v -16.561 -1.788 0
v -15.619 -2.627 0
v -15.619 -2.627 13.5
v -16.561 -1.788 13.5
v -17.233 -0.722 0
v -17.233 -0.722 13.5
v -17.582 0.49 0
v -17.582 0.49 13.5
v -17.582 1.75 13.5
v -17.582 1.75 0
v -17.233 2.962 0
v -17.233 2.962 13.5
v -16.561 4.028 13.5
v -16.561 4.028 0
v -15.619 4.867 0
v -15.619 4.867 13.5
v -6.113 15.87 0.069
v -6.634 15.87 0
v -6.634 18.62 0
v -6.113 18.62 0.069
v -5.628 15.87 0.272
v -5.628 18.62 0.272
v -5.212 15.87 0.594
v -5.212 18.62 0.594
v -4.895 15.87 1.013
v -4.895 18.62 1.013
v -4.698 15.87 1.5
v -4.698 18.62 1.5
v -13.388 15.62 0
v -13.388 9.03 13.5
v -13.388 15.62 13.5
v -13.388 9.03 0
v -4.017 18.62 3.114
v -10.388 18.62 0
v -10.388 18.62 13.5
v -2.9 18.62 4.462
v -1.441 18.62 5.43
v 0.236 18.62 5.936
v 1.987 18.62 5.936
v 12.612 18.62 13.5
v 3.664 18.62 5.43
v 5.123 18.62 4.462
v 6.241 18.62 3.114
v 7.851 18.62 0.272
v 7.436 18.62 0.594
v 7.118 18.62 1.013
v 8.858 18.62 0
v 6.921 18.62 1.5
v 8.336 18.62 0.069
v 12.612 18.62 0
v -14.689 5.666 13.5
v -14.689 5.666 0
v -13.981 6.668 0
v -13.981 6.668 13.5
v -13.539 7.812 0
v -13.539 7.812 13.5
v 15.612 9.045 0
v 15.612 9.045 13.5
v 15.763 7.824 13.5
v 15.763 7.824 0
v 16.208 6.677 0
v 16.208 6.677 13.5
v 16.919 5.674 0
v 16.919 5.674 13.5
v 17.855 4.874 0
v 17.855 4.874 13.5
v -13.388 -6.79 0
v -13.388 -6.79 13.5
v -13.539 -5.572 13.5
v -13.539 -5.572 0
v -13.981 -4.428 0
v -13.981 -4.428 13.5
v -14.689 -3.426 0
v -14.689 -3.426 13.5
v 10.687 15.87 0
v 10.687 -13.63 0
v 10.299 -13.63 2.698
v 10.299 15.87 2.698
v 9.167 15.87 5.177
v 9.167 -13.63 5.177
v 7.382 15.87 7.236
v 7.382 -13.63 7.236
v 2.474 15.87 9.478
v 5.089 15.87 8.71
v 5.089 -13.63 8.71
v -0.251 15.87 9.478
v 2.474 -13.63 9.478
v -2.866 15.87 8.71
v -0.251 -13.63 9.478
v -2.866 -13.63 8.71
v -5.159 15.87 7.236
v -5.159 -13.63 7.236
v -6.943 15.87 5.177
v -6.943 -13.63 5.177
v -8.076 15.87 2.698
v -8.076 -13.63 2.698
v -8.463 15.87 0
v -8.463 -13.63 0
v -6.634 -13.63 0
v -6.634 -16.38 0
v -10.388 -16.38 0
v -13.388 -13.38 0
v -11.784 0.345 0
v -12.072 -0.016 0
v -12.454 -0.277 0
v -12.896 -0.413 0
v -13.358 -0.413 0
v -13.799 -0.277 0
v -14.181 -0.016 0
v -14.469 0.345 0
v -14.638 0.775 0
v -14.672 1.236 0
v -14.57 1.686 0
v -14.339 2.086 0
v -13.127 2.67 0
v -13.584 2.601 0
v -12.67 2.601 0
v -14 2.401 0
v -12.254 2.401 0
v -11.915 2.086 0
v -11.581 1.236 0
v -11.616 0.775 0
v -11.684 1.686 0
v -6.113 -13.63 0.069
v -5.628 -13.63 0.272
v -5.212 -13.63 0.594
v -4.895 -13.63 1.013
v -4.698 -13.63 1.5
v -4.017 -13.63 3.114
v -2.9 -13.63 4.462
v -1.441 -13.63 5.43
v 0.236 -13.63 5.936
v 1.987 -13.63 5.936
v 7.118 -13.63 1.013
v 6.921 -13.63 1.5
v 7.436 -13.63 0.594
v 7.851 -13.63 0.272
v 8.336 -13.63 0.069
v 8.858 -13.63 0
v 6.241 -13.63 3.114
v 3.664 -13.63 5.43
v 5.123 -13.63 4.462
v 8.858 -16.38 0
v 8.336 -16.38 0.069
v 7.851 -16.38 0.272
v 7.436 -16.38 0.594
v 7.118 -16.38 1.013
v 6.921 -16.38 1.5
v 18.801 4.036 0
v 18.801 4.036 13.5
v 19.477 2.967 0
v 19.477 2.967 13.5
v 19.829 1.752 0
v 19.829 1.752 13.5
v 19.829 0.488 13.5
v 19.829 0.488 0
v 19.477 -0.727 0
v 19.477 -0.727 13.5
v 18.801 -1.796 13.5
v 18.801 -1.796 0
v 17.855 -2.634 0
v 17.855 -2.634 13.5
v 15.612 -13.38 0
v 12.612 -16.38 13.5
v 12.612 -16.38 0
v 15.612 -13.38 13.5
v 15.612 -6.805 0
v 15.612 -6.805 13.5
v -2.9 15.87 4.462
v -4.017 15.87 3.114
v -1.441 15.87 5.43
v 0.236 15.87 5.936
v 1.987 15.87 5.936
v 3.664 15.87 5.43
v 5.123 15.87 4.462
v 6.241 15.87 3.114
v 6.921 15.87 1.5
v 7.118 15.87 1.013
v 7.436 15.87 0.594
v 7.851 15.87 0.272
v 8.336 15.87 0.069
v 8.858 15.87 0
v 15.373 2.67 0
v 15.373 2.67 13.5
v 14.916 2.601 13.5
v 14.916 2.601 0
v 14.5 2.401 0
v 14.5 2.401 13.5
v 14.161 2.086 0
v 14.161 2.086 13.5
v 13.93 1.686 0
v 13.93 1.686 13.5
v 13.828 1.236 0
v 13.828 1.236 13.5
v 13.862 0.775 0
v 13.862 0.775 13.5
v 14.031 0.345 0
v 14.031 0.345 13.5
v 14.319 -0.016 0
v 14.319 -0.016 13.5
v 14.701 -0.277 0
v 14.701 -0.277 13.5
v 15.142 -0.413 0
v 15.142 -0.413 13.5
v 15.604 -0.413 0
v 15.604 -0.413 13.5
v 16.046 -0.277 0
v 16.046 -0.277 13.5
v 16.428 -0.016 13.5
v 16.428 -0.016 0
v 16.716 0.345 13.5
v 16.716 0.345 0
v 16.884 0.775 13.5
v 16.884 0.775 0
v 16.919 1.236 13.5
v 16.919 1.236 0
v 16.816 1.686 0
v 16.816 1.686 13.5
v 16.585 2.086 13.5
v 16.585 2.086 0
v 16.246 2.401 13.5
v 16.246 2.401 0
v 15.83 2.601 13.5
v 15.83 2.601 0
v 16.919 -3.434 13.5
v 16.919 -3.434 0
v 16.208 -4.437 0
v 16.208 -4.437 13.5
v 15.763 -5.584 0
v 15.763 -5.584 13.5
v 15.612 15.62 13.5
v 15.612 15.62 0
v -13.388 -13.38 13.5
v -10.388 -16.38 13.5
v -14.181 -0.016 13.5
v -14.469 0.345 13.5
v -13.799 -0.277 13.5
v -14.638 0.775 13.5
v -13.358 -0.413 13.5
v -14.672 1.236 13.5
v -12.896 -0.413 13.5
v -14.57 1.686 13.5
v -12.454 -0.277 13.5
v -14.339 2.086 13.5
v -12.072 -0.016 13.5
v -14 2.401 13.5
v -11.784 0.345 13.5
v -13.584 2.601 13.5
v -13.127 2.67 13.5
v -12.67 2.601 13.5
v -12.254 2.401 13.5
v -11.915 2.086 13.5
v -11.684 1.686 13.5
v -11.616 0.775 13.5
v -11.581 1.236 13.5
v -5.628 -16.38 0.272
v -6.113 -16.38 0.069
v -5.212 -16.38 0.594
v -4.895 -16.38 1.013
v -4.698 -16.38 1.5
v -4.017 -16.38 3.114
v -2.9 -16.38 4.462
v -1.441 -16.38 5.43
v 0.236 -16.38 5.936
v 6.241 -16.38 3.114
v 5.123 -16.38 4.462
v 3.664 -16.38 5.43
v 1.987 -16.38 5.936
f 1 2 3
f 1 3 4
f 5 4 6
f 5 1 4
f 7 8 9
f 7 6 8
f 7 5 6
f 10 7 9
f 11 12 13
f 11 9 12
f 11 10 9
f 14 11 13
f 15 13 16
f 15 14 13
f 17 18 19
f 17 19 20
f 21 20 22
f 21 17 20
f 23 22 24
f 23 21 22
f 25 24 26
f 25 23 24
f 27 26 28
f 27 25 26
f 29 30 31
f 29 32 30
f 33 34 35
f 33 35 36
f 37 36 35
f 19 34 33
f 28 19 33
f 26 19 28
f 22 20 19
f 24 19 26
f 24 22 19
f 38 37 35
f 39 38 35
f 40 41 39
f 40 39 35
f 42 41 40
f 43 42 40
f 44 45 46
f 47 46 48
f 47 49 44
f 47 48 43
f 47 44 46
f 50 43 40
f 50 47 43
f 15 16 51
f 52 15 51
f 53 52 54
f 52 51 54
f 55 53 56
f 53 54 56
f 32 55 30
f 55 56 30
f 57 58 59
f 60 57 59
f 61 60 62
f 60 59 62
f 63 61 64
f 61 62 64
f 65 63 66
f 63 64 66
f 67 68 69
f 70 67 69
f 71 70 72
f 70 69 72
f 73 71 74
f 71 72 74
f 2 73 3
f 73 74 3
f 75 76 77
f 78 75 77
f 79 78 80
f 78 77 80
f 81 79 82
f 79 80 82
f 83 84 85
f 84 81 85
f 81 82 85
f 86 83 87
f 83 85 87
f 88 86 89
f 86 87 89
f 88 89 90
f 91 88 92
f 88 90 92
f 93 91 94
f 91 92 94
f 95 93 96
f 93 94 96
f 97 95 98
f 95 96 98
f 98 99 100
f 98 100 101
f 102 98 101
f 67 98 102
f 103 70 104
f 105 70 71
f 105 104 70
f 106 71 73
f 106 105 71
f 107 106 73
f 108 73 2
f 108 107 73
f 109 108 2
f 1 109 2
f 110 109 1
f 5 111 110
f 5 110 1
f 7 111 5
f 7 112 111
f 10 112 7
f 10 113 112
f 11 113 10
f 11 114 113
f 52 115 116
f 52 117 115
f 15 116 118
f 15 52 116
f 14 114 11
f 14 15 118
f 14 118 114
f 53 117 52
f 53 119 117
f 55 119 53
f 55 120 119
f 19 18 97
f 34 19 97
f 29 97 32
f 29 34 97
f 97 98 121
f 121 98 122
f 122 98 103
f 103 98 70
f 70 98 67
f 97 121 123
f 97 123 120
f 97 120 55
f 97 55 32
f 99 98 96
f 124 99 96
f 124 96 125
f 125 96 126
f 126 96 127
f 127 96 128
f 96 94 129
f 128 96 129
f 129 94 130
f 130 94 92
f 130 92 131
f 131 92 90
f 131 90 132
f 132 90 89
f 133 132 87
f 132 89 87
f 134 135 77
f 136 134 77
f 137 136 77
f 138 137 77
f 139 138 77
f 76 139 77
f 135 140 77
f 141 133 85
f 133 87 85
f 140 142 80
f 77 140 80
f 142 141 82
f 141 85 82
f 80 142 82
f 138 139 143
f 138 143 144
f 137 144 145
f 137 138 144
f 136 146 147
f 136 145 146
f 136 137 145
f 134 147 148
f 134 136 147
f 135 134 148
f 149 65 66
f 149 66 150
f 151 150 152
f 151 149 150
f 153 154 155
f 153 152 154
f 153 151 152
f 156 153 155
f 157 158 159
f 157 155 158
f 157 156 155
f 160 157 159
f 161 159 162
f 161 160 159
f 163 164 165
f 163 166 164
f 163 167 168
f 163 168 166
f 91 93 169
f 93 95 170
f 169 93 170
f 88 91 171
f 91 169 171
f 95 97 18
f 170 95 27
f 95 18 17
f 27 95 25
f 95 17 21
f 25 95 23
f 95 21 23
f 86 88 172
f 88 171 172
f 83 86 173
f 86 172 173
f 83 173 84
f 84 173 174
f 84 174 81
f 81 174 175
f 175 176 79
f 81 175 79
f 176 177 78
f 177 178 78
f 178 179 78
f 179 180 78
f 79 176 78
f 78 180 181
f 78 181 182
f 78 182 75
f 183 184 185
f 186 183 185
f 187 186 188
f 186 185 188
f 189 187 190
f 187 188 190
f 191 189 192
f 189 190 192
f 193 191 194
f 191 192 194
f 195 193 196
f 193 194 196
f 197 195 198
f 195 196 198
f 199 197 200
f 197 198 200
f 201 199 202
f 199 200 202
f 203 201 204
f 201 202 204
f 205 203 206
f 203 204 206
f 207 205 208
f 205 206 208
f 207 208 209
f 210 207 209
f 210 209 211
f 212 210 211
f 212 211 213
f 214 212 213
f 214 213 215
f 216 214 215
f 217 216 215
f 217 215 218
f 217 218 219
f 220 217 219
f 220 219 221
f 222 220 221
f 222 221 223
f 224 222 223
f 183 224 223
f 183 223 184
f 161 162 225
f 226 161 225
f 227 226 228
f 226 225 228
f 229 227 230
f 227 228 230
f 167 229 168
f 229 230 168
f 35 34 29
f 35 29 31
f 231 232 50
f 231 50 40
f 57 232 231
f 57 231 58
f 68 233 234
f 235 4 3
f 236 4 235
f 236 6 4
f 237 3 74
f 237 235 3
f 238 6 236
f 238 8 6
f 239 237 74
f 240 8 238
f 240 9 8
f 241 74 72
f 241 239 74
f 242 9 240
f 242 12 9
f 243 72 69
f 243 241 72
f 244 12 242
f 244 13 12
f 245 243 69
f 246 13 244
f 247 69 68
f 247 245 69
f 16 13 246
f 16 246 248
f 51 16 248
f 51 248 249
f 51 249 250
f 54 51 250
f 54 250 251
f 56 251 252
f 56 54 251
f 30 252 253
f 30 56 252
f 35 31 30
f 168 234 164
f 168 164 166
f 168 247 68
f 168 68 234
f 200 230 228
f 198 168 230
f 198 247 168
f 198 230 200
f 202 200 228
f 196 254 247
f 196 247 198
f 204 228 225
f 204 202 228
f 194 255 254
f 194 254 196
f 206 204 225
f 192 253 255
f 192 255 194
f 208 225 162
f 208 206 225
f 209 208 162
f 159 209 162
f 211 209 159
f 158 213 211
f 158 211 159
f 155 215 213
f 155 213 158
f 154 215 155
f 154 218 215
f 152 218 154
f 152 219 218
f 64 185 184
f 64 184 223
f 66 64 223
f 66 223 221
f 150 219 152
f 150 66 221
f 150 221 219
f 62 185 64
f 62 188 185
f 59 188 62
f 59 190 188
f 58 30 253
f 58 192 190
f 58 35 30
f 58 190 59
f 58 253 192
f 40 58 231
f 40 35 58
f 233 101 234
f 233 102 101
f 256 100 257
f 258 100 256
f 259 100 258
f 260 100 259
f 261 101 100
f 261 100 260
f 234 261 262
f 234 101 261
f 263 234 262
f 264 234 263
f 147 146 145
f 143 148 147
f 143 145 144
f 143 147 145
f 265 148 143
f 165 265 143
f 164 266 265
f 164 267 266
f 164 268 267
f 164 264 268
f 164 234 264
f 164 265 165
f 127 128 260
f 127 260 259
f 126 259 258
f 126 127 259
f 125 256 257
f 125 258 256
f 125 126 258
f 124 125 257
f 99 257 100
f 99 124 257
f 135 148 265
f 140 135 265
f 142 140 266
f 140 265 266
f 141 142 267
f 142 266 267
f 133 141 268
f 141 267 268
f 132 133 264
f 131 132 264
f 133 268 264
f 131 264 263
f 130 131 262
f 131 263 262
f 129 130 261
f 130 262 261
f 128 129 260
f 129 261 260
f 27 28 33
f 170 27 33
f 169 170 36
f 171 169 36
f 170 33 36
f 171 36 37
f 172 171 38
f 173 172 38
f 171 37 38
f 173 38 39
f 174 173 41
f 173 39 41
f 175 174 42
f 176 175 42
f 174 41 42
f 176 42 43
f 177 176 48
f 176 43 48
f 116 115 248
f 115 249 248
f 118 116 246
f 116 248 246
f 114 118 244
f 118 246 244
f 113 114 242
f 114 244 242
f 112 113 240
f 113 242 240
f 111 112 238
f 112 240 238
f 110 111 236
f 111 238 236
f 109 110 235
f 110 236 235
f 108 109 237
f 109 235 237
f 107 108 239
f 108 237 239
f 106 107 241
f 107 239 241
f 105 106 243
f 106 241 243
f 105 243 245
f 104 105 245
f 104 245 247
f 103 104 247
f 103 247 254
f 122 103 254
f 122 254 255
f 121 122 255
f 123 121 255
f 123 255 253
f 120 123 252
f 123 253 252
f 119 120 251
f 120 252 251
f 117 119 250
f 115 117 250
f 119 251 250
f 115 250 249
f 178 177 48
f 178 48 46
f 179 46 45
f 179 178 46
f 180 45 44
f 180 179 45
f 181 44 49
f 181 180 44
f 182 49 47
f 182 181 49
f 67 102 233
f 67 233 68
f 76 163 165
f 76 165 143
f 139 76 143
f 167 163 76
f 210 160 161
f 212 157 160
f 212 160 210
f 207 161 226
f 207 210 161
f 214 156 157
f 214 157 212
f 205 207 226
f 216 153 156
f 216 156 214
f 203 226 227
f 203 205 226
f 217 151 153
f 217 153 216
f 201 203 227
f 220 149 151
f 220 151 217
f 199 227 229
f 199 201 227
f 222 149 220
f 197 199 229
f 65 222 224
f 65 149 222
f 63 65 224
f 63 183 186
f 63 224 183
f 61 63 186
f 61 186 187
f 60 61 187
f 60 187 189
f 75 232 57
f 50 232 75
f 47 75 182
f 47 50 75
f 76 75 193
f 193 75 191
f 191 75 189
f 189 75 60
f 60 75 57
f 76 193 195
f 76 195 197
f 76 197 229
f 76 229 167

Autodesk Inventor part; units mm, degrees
ref_plane "YZ Plane" through (0, 0, 0) normal (1, 0, 0) x (0, 1, 0)
ref_plane "XZ Plane" through (0, 0, 0) normal (0, 1, 0) x (-1, 0, 0)
ref_plane "XY Plane" through (0, 0, 0) normal (0, 0, 1) x (1, 0, 0)
sketch "Szkic1" plane through (0, 0, 0) normal (0, 0, 1) x (1, 0, 0)
  line L0 (-13.3884, 18.62) -> (15.6116, 18.62)
  line L1 (15.6116, 18.62) -> (15.6116, -16.38)
  line L2 (15.6116, -16.38) -> (-13.3884, -16.38)
  line L3 (-13.3884, -16.38) -> (-13.3884, 18.62)
  arc A0 (-13.3884, 5.6124) -> (-13.3884, -3.3724) centre (-13.1267, 1.12) ccw
  arc A1 (15.6116, -3.3737) -> (15.6116, 5.6137) centre (15.3733, 1.12) ccw
  point P0 (0, 0)
  dimension "d2" = 35
  dimension "d5" = 28.5
  dimension "d6" = 29
  dimension "d7" = 17.5
  dimension "d8" = 17.5
  dimension "d9" = 9
  dimension "d10" = 9
extrude "Wyciągnięcie proste1" add sketch "Szkic1" along normal blind 13.5
hole "Otwór1" at (-13.1267, 1.12, 0) at (15.3733, 1.12, 0) direction (0, 0, 1) diameter 3.1 end through all
sketch "Szkic2" plane through (-13.3884, -16.38, 0) normal (0, -1, 0) x (1, 0, 0)
  line L0 (29, 0) -> (0, 0) projected
  line L1 (29, 0) -> (29, 13.5) projected
  line L2 (0, 13.5) -> (29, 13.5) projected
  line L3 (0, 0) -> (0, 13.5) projected
  circle A0 centre (14.5, 0) radius 9.575
  point P0 (13.3884, 0)
  dimension "d18" = 13.5
  dimension "d19" = 14.5
  dimension "d20" = 29
  dimension "d21" = 19.15
extrude "Wyciągnięcie proste2" cut sketch "Szkic2" against normal through all contours A0 L0 | L0 A0
sketch "Szkic3" plane through (-13.3884, -16.38, 13.5) normal (0, -1, 0) x (1, 0, 0)
  arc A0 (24.075, -13.5) -> (4.925, -13.5) centre (14.5, -13.5) ccw projected
  line L0 (29, -13.5) -> (24.075, -13.5) projected
  line L1 (29, -13.5) -> (29, 0) projected
  line L2 (0, 0) -> (29, 0) projected
  line L3 (0, -13.5) -> (0, 0) projected
  line L4 (4.925, -13.5) -> (0, -13.5) projected
  arc A1 (20.5, -13.5) -> (8.5, -13.5) centre (14.5, -13.5) ccw
  line L5 (0, -13.5) -> (4.925, -13.5) projected
  arc A2 (24.075, -13.5) -> (4.925, -13.5) centre (14.5, -13.5) ccw projected
  line L6 (4.925, -13.5) -> (24.075, -13.5)
  point P0 (13.3884, -13.5)
  dimension "d24" = 12
extrude "Wyciągnięcie proste3" add sketch "Szkic3" against normal blind 2.75 contours L6 A1 A0
sketch "Szkic4" plane through (-13.3884, 18.62, 13.5) normal (0, 1, 0) x (1, 0, 0)
  line L0 (8.5, 13.5) -> (4.925, 13.5) projected
  arc A0 (4.925, 13.5) -> (24.075, 13.5) centre (14.5, 13.5) ccw projected
  line L1 (24.075, 13.5) -> (20.5, 13.5) projected
  arc A1 (8.5, 13.5) -> (20.5, 13.5) centre (14.5, 13.5) ccw projected
  arc A2 (4.925, 13.5) -> (24.075, 13.5) centre (14.5, 13.5) ccw projected
  line L2 (0, 13.5) -> (4.925, 13.5) projected
  line L3 (0, 13.5) -> (0, 0) projected
  line L4 (29, 0) -> (0, 0) projected
  line L5 (29, 13.5) -> (29, 0) projected
  line L6 (24.075, 13.5) -> (29, 13.5) projected
  point P0 (13.3884, 13.5)
extrude "Wyciągnięcie proste4" add sketch "Szkic4" against normal blind 2.75 contours A1 L1 A0 L0
fillet "Zaokrąglenie1" radius 5 4 edges at (15.6116, 5.6137, 6.75) (15.6116, -3.3737, 6.75) (-13.3884, -3.3724, 6.75) (-13.3884, 5.6124, 6.75)
fillet "Zaokrąglenie2" radius 2 4 edges at (7.1116, -15.005, 0) (-4.8884, -15.005, 0) (7.1116, 17.245, 0) (-4.8884, 17.245, 0)
chamfer "Faza1" distance 3 angle 45 4 edges at (-13.3884, 18.62, 6.75) (15.6116, 18.62, 6.75) (-13.3884, -16.38, 6.75) (15.6116, -16.38, 6.75)
equation "\"d7\" = 0.5 * d2"
equation "\"d8\" = d7"
equation "\"d19\" = 0.5 * d20"
properties part number "3DP_ABS_Y_Axis_Linear_Bearing_Mount_Top"
